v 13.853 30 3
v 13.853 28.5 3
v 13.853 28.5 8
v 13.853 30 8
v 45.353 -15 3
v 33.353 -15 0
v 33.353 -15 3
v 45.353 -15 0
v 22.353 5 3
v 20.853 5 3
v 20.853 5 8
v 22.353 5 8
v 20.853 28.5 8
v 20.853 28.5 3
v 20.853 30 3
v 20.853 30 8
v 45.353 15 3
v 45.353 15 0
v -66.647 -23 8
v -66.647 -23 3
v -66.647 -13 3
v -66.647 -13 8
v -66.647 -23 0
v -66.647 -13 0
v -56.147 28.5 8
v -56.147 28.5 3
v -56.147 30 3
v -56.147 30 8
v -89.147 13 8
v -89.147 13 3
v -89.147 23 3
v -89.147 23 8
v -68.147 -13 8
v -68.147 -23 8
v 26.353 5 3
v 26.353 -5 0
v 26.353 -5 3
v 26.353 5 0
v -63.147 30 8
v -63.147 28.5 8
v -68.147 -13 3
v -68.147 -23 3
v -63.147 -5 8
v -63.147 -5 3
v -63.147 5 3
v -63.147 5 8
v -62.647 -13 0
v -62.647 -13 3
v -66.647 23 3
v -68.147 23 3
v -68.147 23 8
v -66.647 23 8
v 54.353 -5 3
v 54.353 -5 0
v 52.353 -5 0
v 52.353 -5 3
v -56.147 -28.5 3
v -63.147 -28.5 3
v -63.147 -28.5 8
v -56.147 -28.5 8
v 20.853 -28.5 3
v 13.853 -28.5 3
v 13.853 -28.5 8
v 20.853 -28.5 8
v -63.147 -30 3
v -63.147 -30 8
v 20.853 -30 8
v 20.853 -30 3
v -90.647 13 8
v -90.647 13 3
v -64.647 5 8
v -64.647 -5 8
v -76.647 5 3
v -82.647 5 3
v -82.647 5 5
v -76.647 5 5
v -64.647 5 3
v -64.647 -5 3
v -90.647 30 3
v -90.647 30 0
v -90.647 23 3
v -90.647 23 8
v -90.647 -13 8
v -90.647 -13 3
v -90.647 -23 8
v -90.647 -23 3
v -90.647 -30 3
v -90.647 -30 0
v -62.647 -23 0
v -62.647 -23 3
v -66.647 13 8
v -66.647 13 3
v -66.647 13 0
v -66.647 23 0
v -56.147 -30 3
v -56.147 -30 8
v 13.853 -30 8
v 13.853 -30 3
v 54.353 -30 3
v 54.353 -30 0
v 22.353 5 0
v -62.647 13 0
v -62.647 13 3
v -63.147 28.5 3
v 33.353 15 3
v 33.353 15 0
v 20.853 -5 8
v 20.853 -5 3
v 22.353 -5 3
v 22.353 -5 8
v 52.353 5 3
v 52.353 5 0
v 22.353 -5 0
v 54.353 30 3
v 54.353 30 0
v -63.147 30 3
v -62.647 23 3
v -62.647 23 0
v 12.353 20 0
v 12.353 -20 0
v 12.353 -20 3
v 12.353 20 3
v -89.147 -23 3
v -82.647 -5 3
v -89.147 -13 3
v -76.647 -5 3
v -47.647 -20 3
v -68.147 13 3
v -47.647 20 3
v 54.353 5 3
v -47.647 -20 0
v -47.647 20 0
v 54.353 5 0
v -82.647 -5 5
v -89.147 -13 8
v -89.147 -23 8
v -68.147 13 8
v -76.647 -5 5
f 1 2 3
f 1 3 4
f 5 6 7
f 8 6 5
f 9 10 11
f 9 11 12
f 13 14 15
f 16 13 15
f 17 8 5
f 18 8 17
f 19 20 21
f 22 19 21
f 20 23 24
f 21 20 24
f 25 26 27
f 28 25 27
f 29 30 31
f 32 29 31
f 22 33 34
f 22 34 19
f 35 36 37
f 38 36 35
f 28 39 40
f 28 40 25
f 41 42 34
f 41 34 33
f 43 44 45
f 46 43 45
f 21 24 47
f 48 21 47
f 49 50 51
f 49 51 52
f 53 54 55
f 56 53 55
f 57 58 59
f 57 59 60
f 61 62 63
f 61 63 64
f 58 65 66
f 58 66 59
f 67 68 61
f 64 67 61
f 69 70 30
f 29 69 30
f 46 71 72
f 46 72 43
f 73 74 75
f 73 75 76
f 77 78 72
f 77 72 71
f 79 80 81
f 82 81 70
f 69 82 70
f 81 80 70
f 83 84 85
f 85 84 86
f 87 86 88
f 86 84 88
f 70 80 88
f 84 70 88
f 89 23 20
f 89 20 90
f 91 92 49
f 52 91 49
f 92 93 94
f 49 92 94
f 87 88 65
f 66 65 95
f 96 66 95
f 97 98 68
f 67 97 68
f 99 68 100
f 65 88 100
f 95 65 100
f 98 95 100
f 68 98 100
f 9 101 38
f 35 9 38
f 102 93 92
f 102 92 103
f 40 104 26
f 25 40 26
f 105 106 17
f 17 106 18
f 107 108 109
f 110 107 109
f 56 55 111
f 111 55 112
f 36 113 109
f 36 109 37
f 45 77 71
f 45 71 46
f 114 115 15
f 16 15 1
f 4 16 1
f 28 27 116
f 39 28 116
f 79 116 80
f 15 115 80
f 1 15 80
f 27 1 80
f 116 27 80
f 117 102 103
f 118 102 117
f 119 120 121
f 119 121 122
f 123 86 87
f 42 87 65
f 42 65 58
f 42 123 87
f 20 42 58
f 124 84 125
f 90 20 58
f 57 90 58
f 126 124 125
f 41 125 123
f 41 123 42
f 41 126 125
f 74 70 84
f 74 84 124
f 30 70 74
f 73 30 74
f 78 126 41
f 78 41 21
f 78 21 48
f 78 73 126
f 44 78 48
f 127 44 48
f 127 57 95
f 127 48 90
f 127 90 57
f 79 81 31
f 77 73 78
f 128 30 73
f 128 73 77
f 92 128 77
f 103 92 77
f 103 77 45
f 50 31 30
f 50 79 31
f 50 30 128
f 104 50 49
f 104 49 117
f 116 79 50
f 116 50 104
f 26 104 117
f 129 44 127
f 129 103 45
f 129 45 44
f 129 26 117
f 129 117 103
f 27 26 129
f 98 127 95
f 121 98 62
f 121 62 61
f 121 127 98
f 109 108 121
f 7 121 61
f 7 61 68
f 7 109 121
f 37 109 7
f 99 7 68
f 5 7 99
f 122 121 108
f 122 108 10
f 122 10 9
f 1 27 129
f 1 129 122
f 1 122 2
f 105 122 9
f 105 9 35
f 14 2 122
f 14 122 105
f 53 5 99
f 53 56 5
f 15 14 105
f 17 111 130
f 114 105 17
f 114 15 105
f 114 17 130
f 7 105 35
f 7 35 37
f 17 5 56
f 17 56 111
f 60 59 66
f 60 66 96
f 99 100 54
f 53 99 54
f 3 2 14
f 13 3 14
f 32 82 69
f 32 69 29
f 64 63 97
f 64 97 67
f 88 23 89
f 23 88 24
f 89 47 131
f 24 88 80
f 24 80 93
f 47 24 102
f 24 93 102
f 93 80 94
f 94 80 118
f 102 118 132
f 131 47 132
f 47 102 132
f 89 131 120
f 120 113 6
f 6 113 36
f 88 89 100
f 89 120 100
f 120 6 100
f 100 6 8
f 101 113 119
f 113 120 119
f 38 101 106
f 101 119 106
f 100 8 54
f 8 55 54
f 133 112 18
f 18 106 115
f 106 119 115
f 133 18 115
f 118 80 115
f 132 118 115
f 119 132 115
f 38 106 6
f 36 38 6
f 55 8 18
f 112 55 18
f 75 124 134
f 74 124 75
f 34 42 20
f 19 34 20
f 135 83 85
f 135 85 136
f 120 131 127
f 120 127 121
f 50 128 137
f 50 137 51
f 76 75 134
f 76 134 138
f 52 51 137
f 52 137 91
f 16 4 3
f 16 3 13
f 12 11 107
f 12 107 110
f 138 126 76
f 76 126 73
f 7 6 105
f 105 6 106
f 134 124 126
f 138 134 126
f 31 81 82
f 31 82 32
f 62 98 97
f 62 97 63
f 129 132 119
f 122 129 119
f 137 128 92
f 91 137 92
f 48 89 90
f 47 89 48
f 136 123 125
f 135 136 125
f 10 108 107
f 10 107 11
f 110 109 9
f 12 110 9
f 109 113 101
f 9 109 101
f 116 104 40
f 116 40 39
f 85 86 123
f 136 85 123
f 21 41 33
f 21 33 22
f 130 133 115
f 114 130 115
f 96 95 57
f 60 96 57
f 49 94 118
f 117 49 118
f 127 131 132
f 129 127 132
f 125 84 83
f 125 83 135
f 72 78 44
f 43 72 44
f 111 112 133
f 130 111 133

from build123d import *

# Parameters (mm, degrees)
F0_W     = 4
F0_H     = 10
F0_W_2   = 60
F0_H_2   = 40
F0_W_3   = 12
F0_H_3   = 30
F1_DEPTH = 3
F2_W     = 1.5
F2_H     = 10
F2_W_2   = 7
F2_H_2   = 1.5
F3_DEPTH = 5
F4_W     = 6
F4_H     = 10
F5_DEPTH = 2


with BuildPart() as f1:
    # F0 (on Top) → F1 (new body)
    with BuildSketch(Plane.XY):
        Polygon((54.352519, 30), (-90.647481, 30), (-90.647481, -30), (54.352519, -30), (54.352519, -5), (52.352519, -5), (52.352519, 5), (54.352519, 5), align=None)
        with Locations((-64.647481, -18)):
            Rectangle(F0_W, F0_H, mode=Mode.SUBTRACT)
        with Locations((-64.647481, 18)):
            Rectangle(F0_W, F0_H, mode=Mode.SUBTRACT)
        with Locations((-17.647481, 0)):
            Rectangle(F0_W_2, F0_H_2, mode=Mode.SUBTRACT)
        with Locations((24.352519, 0)):
            Rectangle(F0_W, F0_H, mode=Mode.SUBTRACT)
        with Locations((39.352519, 0)):
            Rectangle(F0_W_3, F0_H_3, mode=Mode.SUBTRACT)
    extrude(amount=F1_DEPTH)

    # F2 (on face) → F3 (join)
    with BuildSketch(Plane.XY.offset(3)):
        with Locations((-67.397481, -18)):
            Rectangle(F2_W, F2_H)
        with Locations((-89.897481, -18)):
            Rectangle(F2_W, F2_H)
        with Locations((-67.397481, 18)):
            Rectangle(F2_W, F2_H)
        with Locations((-89.897481, 18)):
            Rectangle(F2_W, F2_H)
        with Locations((-59.647481, -29.25)):
            Rectangle(F2_W_2, F2_H_2)
        with Locations((17.352519, -29.25)):
            Rectangle(F2_W_2, F2_H_2)
        with Locations((-59.647481, 29.25)):
            Rectangle(F2_W_2, F2_H_2)
        with Locations((17.352519, 29.25)):
            Rectangle(F2_W_2, F2_H_2)
        with Locations((21.602519, 0)):
            Rectangle(F2_W, F2_H)
        with Locations((-63.897481, 0)):
            Rectangle(F2_W, F2_H)
    extrude(amount=F3_DEPTH)

    # F4 (on face) → F5 (join)
    with BuildSketch(Plane.XY.offset(3)):
        with Locations((-79.647481, 0)):
            Rectangle(F4_W, F4_H)
    extrude(amount=F5_DEPTH)


solid = f1.part
